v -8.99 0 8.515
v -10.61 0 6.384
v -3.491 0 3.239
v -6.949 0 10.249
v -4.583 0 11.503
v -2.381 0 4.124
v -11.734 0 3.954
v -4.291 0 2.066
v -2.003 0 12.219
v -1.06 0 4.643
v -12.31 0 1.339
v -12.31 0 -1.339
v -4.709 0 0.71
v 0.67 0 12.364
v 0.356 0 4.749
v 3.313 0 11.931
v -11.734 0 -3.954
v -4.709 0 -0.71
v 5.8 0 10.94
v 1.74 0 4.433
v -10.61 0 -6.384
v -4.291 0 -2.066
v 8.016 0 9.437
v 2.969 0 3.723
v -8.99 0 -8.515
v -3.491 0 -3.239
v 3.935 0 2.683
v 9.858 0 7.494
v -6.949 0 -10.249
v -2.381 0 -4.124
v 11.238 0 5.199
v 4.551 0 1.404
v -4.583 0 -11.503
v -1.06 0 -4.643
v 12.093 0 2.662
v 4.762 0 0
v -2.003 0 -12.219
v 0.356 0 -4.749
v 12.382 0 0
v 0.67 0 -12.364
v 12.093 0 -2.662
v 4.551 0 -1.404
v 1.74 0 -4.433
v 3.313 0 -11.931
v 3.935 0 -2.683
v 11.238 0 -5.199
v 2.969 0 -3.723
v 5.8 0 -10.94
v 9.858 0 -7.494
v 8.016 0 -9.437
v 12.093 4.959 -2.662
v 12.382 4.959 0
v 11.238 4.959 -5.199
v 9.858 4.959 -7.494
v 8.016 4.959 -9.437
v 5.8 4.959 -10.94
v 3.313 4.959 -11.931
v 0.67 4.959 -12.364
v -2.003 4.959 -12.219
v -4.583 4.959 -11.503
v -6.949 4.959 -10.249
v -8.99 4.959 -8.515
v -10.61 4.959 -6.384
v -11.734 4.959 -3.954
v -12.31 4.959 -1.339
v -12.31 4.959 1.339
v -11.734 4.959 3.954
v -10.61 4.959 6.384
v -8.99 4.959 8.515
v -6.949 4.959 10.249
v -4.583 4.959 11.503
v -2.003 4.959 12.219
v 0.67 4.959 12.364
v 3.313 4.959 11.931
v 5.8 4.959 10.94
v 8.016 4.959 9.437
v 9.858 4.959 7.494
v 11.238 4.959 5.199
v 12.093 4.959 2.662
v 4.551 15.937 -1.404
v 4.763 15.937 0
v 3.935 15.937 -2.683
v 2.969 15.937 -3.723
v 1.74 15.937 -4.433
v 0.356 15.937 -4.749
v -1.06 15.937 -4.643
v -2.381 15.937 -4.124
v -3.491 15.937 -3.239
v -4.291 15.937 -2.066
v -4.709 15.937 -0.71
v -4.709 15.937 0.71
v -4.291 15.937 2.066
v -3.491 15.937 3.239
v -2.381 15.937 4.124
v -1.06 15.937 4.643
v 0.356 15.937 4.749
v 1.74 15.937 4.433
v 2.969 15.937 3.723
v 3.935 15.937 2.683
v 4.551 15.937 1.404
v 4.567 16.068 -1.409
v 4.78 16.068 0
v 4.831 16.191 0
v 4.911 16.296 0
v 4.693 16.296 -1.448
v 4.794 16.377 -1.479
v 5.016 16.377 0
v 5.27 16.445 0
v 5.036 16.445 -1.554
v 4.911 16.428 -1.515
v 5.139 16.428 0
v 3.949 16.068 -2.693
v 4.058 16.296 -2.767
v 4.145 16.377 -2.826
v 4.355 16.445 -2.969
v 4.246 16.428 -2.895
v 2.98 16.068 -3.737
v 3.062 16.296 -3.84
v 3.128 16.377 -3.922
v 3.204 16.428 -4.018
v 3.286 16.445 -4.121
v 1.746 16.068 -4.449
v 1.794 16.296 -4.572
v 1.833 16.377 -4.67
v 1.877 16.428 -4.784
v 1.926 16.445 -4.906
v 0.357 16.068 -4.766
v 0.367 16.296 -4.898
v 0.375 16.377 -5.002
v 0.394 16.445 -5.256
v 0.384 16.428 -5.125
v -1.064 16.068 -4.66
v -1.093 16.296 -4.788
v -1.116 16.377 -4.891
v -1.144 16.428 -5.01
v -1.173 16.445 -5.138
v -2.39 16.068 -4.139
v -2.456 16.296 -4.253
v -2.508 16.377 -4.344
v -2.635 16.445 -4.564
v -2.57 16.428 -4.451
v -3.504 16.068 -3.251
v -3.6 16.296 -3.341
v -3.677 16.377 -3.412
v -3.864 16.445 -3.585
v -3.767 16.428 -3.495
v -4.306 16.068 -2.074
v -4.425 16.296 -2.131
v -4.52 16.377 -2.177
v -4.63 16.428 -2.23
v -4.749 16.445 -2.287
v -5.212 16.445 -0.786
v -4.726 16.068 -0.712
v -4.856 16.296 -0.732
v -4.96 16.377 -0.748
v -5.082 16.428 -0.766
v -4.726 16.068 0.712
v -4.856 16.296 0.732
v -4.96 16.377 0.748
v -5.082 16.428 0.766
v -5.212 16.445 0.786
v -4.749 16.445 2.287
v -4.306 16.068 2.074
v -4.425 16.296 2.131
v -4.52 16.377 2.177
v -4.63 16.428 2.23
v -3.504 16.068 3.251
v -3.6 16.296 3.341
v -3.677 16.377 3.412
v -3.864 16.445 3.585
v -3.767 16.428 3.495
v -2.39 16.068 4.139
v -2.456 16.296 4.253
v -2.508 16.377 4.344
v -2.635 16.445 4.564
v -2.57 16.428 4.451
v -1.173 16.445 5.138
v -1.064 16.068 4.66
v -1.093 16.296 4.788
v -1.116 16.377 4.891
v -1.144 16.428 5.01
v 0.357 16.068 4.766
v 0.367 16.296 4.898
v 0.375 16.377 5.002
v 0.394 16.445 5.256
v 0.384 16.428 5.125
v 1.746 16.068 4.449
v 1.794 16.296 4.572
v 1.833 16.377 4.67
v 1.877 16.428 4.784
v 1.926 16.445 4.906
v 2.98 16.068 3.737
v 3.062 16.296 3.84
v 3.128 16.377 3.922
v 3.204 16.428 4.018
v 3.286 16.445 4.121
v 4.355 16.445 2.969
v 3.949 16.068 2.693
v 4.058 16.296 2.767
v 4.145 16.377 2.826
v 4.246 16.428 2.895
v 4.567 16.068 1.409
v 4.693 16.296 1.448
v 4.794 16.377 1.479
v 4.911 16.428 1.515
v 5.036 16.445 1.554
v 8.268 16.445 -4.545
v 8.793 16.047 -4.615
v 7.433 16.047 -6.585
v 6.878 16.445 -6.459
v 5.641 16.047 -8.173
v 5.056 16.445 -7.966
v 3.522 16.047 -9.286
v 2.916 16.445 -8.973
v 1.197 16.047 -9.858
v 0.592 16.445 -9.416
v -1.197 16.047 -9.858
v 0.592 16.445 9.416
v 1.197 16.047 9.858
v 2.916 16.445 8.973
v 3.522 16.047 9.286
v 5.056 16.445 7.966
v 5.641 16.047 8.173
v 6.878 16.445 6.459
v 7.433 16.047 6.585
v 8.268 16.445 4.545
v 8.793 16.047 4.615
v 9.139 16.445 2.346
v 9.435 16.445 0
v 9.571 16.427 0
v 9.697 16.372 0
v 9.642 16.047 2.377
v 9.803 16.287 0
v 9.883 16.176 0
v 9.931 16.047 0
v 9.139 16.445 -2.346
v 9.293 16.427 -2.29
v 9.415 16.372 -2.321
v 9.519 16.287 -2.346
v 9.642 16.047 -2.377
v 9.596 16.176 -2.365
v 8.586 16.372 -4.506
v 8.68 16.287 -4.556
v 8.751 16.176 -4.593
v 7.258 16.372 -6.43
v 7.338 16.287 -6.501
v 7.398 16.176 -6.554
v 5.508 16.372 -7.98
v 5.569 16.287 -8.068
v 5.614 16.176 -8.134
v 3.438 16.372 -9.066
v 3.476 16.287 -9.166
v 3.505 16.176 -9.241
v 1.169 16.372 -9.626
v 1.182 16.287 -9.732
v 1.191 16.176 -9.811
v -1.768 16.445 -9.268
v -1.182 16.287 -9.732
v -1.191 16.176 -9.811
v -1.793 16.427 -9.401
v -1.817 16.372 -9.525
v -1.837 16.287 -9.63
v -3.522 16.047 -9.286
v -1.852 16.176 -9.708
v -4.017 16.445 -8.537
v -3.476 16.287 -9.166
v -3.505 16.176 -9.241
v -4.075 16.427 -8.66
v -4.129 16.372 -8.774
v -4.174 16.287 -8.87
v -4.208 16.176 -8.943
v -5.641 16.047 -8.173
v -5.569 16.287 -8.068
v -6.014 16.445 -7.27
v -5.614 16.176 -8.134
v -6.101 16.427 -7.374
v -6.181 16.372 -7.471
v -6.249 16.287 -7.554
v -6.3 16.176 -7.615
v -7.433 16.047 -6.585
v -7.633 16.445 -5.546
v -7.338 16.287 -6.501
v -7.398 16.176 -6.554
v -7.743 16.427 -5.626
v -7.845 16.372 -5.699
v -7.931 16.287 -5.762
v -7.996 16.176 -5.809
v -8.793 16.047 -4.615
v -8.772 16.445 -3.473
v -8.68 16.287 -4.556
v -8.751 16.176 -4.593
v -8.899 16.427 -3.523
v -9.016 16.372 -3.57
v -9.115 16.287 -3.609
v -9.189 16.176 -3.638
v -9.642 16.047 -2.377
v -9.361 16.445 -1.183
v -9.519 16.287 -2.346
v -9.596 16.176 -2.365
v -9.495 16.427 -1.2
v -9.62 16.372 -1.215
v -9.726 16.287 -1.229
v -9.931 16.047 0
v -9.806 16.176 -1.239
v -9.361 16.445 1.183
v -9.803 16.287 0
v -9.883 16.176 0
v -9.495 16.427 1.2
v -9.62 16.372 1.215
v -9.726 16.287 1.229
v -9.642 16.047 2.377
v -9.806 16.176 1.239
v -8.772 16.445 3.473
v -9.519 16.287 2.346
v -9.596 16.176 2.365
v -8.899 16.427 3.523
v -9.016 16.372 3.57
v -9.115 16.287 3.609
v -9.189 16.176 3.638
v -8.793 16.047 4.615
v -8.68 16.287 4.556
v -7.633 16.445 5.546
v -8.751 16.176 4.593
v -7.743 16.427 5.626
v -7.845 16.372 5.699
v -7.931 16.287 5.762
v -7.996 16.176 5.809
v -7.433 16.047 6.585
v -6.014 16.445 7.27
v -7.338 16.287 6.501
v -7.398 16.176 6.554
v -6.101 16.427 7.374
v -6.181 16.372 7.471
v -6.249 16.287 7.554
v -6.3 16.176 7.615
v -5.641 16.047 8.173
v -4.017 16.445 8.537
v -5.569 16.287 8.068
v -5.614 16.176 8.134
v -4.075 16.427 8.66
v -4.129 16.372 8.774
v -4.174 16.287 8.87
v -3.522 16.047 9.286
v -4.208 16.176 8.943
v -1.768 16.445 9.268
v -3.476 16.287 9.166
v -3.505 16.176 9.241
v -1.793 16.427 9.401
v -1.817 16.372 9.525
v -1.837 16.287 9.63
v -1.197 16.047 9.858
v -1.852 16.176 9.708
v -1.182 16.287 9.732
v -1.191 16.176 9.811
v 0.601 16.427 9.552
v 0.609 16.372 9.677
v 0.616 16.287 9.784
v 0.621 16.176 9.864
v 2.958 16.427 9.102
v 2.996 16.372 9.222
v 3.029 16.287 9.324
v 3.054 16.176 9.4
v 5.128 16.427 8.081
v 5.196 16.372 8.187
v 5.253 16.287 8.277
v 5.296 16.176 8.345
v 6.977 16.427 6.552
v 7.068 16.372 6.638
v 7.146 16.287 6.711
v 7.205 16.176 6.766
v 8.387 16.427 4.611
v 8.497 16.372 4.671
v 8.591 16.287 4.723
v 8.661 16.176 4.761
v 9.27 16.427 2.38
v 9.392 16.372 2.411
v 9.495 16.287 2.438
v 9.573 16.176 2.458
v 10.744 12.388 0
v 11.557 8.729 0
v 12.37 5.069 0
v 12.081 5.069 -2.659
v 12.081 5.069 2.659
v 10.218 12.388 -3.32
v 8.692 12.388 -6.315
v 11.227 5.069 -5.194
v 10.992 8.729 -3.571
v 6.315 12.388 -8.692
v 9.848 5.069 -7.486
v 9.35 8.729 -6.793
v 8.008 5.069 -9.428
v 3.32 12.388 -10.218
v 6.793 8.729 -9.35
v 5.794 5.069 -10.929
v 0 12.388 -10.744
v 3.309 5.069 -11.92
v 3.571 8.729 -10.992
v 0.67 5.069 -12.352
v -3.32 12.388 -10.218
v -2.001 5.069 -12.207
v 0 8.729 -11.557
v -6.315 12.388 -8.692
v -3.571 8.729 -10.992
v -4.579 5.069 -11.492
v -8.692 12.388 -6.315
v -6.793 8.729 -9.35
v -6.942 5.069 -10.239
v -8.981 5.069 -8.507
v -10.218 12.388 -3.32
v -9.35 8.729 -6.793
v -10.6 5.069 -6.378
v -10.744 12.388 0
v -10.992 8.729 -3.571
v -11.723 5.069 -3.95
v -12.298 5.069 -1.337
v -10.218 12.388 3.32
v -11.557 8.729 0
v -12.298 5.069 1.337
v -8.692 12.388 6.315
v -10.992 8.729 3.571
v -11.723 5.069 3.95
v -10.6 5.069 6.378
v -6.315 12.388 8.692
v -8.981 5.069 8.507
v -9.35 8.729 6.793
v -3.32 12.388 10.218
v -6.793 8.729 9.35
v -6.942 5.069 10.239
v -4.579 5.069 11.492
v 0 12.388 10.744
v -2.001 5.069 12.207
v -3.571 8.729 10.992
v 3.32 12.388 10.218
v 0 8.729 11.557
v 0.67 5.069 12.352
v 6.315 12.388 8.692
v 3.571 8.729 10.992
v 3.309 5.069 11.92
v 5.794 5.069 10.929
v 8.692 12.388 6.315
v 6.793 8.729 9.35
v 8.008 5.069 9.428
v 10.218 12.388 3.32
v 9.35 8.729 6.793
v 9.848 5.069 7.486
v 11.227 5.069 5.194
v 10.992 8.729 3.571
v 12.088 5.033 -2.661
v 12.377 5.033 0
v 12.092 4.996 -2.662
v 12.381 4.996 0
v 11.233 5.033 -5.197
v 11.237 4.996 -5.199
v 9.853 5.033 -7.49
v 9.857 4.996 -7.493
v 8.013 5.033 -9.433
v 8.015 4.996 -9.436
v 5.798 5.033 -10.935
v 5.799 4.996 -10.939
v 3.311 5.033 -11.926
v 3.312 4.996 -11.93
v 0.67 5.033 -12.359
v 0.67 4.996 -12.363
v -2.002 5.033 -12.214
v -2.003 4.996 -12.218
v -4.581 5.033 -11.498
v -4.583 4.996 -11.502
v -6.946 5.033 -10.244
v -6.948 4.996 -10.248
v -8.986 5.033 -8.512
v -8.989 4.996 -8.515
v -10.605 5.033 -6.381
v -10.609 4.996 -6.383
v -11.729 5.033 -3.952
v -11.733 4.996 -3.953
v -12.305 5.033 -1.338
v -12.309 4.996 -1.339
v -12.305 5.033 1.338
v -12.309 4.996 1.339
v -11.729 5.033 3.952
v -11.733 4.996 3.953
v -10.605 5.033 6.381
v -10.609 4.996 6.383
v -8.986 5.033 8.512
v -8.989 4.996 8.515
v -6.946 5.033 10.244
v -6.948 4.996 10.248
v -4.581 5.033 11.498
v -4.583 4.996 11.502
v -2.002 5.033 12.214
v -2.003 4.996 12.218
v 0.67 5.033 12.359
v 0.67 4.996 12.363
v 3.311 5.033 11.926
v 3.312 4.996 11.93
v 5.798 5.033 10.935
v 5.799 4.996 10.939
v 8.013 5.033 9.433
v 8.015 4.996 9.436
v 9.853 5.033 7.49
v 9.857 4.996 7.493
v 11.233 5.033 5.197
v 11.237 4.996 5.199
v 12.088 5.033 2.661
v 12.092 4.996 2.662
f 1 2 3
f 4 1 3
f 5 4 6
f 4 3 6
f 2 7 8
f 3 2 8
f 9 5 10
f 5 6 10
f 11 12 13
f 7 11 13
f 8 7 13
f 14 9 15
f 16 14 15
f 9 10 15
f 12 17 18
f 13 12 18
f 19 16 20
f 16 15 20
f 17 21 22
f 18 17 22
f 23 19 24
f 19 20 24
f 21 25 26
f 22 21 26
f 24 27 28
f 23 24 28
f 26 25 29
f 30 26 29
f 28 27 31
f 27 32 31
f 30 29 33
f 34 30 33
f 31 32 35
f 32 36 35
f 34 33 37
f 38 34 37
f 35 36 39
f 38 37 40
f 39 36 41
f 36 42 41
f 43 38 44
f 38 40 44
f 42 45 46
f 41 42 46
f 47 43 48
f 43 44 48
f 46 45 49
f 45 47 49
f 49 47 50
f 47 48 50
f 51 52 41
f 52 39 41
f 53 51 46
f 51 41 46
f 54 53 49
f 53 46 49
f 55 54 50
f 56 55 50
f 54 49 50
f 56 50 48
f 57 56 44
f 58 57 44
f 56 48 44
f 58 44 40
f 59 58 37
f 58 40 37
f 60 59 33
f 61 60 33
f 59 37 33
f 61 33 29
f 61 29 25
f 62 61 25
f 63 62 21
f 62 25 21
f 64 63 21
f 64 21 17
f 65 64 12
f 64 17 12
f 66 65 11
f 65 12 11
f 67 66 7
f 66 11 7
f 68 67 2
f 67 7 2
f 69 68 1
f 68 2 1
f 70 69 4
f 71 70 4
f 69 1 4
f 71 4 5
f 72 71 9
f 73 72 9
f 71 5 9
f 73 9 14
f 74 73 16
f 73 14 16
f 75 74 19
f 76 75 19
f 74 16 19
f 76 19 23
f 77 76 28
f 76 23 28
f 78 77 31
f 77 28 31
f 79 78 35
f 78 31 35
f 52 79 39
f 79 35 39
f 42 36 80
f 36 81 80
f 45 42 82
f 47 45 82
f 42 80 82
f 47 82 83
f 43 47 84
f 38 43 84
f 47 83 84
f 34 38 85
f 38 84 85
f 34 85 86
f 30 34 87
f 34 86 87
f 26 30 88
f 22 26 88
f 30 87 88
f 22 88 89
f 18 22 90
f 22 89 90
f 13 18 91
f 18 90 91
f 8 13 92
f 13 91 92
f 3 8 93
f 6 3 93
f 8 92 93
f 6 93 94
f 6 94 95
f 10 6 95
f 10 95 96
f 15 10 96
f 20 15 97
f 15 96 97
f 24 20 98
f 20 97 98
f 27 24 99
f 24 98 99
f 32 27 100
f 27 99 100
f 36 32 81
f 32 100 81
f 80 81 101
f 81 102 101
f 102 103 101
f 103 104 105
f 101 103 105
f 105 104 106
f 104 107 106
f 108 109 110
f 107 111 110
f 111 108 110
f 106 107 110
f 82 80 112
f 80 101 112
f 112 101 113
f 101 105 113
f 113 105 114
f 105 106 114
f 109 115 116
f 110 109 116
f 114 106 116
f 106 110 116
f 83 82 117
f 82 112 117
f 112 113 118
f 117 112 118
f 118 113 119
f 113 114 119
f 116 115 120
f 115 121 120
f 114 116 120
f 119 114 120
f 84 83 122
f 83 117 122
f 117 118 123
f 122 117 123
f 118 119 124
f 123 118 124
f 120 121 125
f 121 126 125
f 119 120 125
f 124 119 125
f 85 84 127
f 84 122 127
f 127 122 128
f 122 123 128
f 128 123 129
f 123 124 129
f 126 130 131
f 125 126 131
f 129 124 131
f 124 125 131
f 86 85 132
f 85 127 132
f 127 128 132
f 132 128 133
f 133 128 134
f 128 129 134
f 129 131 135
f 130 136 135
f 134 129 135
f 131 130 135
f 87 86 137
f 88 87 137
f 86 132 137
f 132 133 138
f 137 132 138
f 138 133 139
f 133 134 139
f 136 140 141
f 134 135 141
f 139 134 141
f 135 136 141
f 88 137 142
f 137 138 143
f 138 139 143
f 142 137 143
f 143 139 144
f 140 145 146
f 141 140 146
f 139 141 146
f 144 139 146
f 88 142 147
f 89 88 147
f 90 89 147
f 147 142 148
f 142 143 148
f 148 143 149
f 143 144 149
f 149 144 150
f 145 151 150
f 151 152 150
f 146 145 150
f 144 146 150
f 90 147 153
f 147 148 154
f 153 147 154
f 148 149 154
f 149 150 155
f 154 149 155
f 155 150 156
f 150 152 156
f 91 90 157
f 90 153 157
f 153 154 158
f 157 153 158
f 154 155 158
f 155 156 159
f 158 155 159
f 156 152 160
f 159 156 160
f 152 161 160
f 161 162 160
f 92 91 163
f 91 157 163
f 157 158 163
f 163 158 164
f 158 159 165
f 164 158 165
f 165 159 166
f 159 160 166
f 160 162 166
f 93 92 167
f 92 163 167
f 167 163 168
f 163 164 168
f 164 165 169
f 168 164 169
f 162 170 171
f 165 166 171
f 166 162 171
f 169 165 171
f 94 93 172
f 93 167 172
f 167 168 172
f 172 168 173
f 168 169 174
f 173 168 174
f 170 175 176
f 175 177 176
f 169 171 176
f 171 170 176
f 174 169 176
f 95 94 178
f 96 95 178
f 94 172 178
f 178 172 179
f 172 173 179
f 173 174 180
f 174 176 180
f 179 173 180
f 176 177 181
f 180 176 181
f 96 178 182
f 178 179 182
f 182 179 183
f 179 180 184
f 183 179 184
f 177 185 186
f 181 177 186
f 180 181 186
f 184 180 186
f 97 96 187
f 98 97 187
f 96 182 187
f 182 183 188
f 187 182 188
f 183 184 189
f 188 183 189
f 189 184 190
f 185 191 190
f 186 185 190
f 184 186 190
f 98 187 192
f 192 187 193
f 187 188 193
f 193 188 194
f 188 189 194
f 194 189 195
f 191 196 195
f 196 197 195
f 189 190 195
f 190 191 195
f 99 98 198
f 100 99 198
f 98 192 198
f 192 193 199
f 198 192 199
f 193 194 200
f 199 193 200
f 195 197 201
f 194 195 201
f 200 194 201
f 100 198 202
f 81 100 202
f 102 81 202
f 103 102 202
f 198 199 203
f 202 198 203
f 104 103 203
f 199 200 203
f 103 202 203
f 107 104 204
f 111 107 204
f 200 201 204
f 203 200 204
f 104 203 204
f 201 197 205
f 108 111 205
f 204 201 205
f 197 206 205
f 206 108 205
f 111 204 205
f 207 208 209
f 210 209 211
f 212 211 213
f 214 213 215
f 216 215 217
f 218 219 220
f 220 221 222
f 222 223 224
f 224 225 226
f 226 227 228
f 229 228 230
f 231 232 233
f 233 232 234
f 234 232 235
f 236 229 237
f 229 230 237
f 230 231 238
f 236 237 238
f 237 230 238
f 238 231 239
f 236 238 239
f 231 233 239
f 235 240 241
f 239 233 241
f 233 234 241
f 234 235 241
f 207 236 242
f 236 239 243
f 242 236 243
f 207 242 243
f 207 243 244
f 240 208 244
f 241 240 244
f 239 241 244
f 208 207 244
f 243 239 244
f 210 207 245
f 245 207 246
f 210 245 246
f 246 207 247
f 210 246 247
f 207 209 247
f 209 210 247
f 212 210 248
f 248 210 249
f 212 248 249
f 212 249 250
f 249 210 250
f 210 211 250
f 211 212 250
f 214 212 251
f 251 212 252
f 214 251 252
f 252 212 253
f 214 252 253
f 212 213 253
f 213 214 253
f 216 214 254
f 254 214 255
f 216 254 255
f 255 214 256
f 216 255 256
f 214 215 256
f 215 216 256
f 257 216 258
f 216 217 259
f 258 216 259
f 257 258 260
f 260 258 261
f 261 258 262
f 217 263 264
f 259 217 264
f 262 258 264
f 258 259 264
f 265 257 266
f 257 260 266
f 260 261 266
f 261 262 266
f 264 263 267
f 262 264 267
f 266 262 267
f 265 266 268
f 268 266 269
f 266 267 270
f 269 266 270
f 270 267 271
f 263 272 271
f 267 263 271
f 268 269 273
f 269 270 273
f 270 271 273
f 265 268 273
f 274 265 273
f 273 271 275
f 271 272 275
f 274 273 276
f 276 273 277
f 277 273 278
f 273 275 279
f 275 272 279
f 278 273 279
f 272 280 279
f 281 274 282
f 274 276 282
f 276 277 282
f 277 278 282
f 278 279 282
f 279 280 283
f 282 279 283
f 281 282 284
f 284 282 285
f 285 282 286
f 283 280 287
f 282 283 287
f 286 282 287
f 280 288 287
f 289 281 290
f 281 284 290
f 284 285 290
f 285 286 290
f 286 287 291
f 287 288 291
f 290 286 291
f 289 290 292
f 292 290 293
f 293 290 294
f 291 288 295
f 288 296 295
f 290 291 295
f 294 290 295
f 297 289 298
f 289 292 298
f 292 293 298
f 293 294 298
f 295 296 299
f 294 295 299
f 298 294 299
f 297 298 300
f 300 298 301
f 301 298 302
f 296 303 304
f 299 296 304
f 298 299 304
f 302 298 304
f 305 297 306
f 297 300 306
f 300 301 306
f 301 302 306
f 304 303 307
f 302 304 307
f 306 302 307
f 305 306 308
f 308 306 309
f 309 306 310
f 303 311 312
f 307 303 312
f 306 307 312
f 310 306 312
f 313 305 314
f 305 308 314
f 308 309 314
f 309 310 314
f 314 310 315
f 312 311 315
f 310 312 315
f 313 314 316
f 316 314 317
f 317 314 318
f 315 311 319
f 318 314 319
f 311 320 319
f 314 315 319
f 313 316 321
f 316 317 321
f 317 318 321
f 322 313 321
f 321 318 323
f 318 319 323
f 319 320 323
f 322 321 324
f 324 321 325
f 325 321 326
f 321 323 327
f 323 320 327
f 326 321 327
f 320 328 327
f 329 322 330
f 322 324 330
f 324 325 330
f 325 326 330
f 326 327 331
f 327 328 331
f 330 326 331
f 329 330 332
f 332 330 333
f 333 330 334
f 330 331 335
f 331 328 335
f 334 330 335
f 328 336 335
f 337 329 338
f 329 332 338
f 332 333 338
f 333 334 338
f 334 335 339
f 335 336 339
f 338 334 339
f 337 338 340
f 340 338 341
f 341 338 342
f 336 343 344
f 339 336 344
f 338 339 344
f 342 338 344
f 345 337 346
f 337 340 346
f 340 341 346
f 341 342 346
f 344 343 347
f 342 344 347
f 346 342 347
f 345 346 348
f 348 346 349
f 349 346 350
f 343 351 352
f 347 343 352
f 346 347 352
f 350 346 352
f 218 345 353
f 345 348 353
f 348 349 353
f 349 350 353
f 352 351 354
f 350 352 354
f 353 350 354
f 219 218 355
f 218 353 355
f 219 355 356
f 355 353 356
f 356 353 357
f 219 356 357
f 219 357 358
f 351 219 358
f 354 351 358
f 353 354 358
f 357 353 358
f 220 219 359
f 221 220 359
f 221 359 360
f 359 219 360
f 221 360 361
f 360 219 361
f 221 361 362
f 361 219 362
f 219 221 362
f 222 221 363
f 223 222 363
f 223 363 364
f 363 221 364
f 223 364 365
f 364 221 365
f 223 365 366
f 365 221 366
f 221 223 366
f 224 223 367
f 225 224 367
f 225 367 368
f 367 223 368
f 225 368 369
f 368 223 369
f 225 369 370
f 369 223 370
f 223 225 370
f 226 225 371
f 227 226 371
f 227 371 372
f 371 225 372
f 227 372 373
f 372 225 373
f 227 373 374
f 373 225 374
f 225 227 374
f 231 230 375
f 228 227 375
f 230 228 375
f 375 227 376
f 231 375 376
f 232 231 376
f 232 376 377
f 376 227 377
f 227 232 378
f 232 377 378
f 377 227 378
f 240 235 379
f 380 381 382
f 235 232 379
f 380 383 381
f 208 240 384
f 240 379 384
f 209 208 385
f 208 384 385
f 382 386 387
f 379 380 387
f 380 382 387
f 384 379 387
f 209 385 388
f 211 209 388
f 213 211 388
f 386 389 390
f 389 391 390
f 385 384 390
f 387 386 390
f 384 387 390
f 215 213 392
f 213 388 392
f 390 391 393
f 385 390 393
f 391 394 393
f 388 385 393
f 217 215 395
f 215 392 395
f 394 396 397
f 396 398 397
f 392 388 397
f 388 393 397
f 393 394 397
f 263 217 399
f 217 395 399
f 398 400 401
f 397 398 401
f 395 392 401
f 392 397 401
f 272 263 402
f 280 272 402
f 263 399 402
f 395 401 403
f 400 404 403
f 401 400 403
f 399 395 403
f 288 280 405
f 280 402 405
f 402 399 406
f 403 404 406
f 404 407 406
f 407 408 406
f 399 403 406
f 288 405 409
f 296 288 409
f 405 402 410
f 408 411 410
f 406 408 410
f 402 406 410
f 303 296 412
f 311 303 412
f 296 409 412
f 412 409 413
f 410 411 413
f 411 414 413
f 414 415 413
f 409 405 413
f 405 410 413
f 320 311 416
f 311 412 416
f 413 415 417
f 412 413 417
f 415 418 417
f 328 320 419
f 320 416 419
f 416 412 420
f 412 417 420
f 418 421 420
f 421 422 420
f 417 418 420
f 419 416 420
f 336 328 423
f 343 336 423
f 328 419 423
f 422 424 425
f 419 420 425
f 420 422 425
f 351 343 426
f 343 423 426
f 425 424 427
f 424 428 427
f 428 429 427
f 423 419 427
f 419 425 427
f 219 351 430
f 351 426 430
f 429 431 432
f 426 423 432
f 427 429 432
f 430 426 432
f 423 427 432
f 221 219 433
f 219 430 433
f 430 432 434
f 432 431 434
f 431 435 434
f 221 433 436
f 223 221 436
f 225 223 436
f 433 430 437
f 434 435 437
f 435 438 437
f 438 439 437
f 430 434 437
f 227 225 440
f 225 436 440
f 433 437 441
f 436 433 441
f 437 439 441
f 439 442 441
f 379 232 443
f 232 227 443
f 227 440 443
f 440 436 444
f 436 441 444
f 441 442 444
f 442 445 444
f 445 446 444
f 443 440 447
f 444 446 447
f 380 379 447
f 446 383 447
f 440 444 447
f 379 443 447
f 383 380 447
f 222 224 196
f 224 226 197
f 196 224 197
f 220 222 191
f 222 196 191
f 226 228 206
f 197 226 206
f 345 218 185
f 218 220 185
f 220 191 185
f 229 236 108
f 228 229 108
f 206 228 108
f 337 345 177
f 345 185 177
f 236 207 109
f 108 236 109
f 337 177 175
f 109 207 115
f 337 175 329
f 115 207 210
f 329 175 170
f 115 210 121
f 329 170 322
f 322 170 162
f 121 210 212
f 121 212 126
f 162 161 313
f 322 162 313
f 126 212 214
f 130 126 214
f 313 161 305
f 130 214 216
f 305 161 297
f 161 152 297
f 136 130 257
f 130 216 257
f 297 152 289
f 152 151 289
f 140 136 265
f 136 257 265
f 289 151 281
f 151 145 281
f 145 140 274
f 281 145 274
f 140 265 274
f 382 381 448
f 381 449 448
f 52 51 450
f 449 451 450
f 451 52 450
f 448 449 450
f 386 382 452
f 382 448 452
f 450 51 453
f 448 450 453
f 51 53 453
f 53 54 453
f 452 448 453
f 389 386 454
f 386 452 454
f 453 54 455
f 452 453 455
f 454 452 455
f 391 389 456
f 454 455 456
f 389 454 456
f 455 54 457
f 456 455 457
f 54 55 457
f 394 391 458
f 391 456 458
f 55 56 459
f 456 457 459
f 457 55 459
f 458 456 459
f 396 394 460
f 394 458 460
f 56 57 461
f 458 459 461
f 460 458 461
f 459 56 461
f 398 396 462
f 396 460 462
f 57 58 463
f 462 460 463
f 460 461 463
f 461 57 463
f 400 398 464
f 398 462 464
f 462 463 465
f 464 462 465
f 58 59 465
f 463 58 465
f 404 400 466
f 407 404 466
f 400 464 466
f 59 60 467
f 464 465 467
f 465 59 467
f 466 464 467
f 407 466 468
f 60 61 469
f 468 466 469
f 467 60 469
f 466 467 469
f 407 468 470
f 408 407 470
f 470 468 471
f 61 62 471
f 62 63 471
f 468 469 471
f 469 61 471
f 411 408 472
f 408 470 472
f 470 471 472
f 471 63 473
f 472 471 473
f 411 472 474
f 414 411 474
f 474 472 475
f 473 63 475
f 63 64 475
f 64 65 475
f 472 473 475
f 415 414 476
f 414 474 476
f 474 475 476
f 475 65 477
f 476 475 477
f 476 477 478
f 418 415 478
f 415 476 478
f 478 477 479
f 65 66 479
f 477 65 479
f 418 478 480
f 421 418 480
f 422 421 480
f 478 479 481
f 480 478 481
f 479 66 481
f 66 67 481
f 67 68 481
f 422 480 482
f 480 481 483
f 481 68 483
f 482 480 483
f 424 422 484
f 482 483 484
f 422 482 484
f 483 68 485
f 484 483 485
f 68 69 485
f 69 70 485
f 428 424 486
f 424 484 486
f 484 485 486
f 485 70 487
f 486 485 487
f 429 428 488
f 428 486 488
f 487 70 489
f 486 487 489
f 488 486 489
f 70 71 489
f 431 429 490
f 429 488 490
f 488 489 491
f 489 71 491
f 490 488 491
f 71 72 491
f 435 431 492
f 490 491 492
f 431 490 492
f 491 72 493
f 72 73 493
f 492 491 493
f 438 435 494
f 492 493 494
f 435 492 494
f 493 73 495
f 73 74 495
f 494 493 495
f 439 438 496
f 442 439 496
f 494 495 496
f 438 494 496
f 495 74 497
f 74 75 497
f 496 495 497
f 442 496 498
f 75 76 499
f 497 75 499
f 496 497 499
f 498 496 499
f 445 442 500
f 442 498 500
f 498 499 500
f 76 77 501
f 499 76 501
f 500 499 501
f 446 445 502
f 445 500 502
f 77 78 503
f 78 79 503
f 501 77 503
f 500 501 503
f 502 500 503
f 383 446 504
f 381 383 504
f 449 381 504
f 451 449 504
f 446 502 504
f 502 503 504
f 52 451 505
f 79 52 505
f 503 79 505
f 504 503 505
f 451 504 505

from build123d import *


with BuildPart() as part:
    # Sketch1 → Revolve1 (revolve)
    with BuildSketch(Plane.XY):
        with BuildLine():
            Line((4.7625, 0), (4.7625, 15.937))
            ThreePointArc((4.7625, 15.937), (4.911289755, 16.296210245), (5.2705, 16.445))
            Line((5.2705, 16.445), (9.434996824, 16.445))
            ThreePointArc((9.434996824, 16.445), (9.75286634, 16.333261241), (9.930899851, 16.047200673))
            Line((9.930899851, 16.047200673), (12.370403027, 5.06943638))
            ThreePointArc((12.370403027, 5.06943638), (12.379466701, 5.014667028), (12.3825, 4.959235708))
            Line((12.3825, 4.959235708), (12.3825, 0))
            Line((12.3825, 0), (4.7625, 0))
        make_face()
    revolve(axis=Axis((0, 0, 0), (0, 1, 0)))


solid = part.part
